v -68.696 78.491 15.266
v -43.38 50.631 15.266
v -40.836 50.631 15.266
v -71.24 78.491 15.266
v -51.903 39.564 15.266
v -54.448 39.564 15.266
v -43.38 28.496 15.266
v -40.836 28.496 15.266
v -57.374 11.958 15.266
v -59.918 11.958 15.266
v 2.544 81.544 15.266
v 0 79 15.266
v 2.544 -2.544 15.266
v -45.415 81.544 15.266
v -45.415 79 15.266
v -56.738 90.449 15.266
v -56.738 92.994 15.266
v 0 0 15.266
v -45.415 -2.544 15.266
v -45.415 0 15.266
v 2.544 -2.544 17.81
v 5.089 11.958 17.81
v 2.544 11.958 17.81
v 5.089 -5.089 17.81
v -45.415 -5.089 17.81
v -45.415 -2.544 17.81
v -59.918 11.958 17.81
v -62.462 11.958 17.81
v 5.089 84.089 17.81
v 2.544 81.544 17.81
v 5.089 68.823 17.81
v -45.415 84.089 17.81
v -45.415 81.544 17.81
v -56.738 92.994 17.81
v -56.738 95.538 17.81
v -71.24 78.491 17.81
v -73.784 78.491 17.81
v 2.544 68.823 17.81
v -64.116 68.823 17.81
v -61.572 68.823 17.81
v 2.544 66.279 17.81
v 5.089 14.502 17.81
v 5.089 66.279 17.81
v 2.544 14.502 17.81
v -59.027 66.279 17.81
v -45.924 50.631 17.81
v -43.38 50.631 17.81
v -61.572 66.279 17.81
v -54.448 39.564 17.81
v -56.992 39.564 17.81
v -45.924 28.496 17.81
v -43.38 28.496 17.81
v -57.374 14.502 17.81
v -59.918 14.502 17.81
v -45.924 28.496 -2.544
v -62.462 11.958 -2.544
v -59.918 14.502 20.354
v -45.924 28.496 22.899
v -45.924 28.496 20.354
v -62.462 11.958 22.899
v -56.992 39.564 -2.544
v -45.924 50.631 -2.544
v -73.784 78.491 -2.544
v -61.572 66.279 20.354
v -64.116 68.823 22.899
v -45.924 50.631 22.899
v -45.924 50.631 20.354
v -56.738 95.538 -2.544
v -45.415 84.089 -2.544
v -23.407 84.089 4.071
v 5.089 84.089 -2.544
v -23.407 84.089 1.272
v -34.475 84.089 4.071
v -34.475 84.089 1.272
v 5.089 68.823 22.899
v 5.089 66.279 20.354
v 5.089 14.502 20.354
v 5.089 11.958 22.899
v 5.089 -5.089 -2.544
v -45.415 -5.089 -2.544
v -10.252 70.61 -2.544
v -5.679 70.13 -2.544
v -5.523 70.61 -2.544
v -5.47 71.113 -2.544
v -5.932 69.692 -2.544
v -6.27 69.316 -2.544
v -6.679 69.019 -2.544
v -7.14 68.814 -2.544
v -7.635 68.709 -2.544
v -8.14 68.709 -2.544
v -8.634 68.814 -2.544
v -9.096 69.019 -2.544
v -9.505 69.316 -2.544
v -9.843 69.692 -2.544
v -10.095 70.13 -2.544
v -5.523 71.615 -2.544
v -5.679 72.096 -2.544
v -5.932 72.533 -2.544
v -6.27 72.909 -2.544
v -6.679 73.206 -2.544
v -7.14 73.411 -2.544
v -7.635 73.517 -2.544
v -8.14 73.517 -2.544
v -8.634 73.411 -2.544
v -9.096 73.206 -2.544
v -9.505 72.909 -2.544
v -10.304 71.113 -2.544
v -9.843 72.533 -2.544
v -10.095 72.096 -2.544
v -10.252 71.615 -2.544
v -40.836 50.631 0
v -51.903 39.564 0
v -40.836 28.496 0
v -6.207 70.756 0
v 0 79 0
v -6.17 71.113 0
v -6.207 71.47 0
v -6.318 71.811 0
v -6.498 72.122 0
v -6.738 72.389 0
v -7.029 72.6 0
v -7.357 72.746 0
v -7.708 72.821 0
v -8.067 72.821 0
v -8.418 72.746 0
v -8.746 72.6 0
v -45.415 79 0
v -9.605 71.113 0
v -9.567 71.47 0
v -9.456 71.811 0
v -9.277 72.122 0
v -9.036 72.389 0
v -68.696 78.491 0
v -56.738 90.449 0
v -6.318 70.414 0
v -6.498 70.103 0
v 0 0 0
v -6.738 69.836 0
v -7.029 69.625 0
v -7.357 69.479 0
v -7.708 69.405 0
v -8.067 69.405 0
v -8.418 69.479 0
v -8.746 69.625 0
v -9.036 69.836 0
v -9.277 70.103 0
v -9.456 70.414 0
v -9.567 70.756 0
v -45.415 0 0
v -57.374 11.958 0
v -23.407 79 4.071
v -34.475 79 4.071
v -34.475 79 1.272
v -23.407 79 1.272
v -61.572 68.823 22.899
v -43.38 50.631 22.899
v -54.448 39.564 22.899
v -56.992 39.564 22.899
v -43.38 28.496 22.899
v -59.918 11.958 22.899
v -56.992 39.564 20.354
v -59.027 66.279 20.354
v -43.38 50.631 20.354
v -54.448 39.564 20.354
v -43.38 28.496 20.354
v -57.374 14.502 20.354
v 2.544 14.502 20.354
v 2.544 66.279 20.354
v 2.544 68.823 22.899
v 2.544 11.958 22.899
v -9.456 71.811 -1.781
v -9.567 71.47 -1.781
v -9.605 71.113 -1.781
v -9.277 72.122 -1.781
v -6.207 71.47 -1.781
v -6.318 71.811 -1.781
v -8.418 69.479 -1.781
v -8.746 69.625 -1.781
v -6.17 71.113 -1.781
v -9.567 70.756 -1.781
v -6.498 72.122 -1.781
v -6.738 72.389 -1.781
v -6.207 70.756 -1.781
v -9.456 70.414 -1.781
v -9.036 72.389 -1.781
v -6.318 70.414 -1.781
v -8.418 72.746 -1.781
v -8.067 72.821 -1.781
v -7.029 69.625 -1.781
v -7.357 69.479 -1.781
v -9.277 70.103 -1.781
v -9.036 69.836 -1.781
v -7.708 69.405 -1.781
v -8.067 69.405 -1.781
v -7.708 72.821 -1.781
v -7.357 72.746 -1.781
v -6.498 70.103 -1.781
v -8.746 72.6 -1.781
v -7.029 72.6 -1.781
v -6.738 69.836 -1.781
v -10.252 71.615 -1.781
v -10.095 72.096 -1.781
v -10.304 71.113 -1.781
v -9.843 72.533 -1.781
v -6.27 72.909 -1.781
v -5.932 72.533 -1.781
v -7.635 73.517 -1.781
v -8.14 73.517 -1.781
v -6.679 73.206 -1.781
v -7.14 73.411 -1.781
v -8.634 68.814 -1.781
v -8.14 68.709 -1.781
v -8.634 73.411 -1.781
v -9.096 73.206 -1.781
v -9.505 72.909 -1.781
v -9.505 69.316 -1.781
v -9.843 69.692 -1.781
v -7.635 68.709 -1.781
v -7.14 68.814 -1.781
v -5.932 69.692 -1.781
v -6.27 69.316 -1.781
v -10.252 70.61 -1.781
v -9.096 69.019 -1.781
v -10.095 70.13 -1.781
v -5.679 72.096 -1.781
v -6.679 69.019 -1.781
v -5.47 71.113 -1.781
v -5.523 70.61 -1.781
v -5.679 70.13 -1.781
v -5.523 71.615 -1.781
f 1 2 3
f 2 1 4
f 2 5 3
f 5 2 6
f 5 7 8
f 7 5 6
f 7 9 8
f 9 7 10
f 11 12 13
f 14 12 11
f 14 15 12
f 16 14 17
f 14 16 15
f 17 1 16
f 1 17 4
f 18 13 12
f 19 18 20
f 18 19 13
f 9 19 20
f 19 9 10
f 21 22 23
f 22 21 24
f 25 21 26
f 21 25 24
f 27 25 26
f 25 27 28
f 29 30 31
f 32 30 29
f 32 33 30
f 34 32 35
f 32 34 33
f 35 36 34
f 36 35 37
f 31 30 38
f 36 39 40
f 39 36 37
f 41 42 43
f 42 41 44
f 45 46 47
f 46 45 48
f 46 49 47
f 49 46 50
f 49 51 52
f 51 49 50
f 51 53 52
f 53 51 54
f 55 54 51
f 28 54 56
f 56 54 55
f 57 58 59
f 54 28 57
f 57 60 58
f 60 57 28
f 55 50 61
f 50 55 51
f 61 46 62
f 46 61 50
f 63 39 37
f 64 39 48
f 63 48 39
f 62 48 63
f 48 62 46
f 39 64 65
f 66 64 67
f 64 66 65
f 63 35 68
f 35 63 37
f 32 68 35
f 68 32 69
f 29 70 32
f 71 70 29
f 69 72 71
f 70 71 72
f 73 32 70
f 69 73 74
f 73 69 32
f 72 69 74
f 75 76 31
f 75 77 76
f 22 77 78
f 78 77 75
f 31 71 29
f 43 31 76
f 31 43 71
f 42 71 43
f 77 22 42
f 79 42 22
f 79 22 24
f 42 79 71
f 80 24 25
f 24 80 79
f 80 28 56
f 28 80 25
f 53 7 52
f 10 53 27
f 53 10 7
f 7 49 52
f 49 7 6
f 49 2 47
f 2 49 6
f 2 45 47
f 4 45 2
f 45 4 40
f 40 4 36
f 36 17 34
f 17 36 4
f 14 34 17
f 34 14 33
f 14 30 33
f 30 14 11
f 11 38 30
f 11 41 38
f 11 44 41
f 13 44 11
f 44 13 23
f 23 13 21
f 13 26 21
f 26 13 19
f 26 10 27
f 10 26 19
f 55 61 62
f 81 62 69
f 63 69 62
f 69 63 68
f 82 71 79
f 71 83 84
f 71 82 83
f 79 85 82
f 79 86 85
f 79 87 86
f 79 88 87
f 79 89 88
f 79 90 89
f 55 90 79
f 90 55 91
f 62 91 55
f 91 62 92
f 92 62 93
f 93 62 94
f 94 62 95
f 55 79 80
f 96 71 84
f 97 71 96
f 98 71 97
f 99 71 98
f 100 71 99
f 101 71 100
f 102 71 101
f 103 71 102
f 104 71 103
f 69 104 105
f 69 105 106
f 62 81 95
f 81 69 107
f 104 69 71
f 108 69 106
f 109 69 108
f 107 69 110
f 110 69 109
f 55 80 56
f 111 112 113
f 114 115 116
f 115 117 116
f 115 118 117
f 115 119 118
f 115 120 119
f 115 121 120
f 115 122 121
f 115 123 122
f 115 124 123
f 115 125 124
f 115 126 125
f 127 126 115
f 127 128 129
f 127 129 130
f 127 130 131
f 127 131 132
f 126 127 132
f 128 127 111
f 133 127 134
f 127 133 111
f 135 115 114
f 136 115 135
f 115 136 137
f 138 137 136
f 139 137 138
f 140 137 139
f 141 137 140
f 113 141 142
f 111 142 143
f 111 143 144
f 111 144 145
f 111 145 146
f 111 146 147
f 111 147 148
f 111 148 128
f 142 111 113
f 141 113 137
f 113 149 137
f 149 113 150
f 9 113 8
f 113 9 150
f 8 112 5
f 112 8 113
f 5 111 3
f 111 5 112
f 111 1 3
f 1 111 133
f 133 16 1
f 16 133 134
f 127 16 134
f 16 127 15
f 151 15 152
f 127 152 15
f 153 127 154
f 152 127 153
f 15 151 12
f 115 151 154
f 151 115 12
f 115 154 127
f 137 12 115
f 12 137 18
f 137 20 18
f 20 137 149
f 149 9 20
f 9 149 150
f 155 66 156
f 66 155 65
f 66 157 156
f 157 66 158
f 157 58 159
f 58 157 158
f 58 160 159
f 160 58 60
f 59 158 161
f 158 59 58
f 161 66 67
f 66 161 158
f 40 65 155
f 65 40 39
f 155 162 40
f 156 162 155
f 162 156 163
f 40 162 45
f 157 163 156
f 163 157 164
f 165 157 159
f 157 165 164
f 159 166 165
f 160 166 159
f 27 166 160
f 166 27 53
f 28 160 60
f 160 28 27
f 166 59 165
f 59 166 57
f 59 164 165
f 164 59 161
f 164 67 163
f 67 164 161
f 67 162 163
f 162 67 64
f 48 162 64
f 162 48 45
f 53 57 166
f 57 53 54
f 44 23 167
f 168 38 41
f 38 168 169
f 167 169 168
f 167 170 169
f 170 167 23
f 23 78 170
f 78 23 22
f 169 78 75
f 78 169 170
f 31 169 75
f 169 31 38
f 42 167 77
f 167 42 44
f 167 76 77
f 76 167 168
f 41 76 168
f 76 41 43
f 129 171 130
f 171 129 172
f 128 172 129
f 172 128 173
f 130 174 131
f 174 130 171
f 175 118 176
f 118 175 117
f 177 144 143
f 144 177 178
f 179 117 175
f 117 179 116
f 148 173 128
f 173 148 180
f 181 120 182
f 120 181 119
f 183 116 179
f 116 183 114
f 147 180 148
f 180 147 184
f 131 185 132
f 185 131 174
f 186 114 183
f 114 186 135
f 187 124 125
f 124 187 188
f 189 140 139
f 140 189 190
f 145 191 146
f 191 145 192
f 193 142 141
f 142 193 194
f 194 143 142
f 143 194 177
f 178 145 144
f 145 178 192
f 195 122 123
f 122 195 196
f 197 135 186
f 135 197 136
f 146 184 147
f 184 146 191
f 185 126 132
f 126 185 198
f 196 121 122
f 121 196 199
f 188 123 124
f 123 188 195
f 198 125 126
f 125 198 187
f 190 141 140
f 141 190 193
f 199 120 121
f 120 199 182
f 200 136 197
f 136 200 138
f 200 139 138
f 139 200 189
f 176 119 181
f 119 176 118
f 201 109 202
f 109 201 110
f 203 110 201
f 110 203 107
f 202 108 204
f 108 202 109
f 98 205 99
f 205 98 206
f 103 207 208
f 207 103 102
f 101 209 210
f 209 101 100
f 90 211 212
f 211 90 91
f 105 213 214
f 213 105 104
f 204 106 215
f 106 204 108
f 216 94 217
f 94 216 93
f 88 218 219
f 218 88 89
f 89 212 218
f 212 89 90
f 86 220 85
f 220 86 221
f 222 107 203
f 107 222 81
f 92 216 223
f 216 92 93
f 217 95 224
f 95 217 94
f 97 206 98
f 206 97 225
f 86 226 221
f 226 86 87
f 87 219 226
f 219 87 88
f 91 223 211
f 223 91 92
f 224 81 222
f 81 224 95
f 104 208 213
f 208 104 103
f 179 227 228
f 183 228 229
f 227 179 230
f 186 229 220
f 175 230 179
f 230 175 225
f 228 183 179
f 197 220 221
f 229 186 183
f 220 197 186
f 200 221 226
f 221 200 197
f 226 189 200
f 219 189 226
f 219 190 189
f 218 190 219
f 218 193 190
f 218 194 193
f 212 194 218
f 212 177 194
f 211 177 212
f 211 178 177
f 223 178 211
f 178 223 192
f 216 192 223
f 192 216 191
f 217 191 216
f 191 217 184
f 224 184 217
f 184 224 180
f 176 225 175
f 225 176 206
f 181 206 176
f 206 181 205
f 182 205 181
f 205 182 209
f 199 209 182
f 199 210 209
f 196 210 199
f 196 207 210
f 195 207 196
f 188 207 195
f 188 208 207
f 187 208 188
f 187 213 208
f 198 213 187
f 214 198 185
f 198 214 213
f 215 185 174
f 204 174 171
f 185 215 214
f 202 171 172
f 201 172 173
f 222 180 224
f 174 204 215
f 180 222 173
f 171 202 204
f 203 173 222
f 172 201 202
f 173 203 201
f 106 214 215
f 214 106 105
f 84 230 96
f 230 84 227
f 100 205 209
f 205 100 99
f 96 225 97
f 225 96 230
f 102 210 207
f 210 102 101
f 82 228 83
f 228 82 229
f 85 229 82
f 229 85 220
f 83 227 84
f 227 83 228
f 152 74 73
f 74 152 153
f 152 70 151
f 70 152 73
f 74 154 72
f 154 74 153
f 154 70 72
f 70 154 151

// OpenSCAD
//Engduino Case by Jacek Karwowski 2014
//
//Designed for pedometer
//
//Two elements on top (P1, P2) are for belt - user has to put Engduino in, close the cover with the lid (file lid.scad) and put his belt inside these two holes, locking Engduino inside (it cannot fall off from the case in any way). Cover is designed to be as simple as possible without losing usability - there are two tight holes, for button, for and for ON/OFF button, they should fit buttons tightly and therefore not lowering possibility of damage from water (i.e. rain or snow). Although LEDs are used to show counter of steps, since Engduino has to be attached to belt and user has to have access to the button, LEDs must be on the other - invisible - side of board, so there are no holes to see them. There's no hole for SD card, as it could increase probability of getting water inside - it is assumed that user will only check his results in home, when he can take Engduino out of cover.
//Project is made with respect to dimensions taken from Engduino datasheet http://www.engduino.org/fileadmin/engduino/images/EngduinoV3.PDF




w = 20; //Single parameter used for generating the case - it determine width of the walls and also dimensions of elements P1 and P2

scale(79/621) //scale to milimeters
mirror([1, 0, 0])
difference()
{
difference()
{
union()
{
	union()
	{
		difference()
		{
			translate([0, 0, 100+w])
			linear_extrude(height = w, convexity = 10)
			{
				polygon(points = [[0-2*w, 0-2*w], [357, 0-2*w], [451+2*w, 94], [321+2*w, 224], [408+2*w, 311], [321+2*w, 398], [464+2*w, 541], [540+2*w, 617], [446, 711+2*w], [357, 621+2*w], [0-2*w, 621+2*w]]); 
			}//C
		
			translate([0, 0, 100+w-1])
			linear_extrude(height = w+2, convexity = 10)
			{
				polygon(points = [[0-w, 0-w], [357, 0-w], [451+w, 94], [321+w, 224], [408+w, 311], [321+w, 398], [464+w, 541], [540+w, 617], [446, 711+w], [357, 621+w], [0-w, 621+w]]); 
			} //B
		}
		difference()
		{

				translate([0,0,-w])
				linear_extrude(height = 100+2*w, convexity = 10)
				{
					polygon(points = [[0-2*w, 0-2*w], [357, 0-2*w], [451+2*w, 94], [321+2*w, 224], [408+2*w, 311], [321+2*w, 398], [464+2*w, 541], [540+2*w, 617], [446, 711+2*w], [357, 621+2*w], [0-2*w, 621+2*w]]); 
				}//C
				linear_extrude(height = 100+w+1, convexity = 10, twist = 0)
				{
					polygon(points = [[0, 0], [357, 0], [451, 94], [321, 224], [408, 311], [321, 398], [464, 541], [540, 617], [446, 711], [357, 621], [0, 621]]);
				}//A
		
			
			
		
		}
	}
	translate([0,0,100+2*w])
	union()
	{
		difference() //P1
		{
			linear_extrude(height = 2*w, convexity = 10)
			{
			
				polygon(points = [[451+w, 94], [321+w, 224], [408+w, 311], [321+w, 398], [464+w, 541], [464+2*w, 541], [321+2*w, 398], [408+2*w, 311], [321+2*w, 224], [451+2*w, 94]]); //X1
			}
			
			linear_extrude(height = w, convexity = 10)
			{
				polygon(points = [[451-w, 94+w], [321+w, 224], [408+w, 311], [321+w, 398], [464, 541-w], [464+w, 541-w], [321+2*w, 398], [408+2*w, 311], [321+2*w, 224], [451+w, 94+w]]); //X1
			
			}
			
		} 

		difference() //P2
		{
		
			linear_extrude(height = 2*w, convexity = 10)
			{
				polygon(points = [[-w, 94], [-w, 541], [-2*w, 541], [-2*w, 94]]); //X2
			}
			
			linear_extrude(height = w, convexity = 10)
			{
				polygon(points = [[-w, 94+w], [-w, 541-w], [-2*w, 541-w], [-2*w, 94+w]]); //Y2
			}
		} 
	}
}

union()
{
	union() //Button hole
	{
		translate([62, 559, -2*w])
		cylinder(h = 2*w, d = 27);
		
		translate([62, 559, -2*w])
		cylinder(h = 1.3*w, d = 38);
	
	}
	union() //ON/OFF hole
	{
		translate([184, 621, 10])
		scale(1)cube([87, 3*w, 22]);
	}	

}
}
}
